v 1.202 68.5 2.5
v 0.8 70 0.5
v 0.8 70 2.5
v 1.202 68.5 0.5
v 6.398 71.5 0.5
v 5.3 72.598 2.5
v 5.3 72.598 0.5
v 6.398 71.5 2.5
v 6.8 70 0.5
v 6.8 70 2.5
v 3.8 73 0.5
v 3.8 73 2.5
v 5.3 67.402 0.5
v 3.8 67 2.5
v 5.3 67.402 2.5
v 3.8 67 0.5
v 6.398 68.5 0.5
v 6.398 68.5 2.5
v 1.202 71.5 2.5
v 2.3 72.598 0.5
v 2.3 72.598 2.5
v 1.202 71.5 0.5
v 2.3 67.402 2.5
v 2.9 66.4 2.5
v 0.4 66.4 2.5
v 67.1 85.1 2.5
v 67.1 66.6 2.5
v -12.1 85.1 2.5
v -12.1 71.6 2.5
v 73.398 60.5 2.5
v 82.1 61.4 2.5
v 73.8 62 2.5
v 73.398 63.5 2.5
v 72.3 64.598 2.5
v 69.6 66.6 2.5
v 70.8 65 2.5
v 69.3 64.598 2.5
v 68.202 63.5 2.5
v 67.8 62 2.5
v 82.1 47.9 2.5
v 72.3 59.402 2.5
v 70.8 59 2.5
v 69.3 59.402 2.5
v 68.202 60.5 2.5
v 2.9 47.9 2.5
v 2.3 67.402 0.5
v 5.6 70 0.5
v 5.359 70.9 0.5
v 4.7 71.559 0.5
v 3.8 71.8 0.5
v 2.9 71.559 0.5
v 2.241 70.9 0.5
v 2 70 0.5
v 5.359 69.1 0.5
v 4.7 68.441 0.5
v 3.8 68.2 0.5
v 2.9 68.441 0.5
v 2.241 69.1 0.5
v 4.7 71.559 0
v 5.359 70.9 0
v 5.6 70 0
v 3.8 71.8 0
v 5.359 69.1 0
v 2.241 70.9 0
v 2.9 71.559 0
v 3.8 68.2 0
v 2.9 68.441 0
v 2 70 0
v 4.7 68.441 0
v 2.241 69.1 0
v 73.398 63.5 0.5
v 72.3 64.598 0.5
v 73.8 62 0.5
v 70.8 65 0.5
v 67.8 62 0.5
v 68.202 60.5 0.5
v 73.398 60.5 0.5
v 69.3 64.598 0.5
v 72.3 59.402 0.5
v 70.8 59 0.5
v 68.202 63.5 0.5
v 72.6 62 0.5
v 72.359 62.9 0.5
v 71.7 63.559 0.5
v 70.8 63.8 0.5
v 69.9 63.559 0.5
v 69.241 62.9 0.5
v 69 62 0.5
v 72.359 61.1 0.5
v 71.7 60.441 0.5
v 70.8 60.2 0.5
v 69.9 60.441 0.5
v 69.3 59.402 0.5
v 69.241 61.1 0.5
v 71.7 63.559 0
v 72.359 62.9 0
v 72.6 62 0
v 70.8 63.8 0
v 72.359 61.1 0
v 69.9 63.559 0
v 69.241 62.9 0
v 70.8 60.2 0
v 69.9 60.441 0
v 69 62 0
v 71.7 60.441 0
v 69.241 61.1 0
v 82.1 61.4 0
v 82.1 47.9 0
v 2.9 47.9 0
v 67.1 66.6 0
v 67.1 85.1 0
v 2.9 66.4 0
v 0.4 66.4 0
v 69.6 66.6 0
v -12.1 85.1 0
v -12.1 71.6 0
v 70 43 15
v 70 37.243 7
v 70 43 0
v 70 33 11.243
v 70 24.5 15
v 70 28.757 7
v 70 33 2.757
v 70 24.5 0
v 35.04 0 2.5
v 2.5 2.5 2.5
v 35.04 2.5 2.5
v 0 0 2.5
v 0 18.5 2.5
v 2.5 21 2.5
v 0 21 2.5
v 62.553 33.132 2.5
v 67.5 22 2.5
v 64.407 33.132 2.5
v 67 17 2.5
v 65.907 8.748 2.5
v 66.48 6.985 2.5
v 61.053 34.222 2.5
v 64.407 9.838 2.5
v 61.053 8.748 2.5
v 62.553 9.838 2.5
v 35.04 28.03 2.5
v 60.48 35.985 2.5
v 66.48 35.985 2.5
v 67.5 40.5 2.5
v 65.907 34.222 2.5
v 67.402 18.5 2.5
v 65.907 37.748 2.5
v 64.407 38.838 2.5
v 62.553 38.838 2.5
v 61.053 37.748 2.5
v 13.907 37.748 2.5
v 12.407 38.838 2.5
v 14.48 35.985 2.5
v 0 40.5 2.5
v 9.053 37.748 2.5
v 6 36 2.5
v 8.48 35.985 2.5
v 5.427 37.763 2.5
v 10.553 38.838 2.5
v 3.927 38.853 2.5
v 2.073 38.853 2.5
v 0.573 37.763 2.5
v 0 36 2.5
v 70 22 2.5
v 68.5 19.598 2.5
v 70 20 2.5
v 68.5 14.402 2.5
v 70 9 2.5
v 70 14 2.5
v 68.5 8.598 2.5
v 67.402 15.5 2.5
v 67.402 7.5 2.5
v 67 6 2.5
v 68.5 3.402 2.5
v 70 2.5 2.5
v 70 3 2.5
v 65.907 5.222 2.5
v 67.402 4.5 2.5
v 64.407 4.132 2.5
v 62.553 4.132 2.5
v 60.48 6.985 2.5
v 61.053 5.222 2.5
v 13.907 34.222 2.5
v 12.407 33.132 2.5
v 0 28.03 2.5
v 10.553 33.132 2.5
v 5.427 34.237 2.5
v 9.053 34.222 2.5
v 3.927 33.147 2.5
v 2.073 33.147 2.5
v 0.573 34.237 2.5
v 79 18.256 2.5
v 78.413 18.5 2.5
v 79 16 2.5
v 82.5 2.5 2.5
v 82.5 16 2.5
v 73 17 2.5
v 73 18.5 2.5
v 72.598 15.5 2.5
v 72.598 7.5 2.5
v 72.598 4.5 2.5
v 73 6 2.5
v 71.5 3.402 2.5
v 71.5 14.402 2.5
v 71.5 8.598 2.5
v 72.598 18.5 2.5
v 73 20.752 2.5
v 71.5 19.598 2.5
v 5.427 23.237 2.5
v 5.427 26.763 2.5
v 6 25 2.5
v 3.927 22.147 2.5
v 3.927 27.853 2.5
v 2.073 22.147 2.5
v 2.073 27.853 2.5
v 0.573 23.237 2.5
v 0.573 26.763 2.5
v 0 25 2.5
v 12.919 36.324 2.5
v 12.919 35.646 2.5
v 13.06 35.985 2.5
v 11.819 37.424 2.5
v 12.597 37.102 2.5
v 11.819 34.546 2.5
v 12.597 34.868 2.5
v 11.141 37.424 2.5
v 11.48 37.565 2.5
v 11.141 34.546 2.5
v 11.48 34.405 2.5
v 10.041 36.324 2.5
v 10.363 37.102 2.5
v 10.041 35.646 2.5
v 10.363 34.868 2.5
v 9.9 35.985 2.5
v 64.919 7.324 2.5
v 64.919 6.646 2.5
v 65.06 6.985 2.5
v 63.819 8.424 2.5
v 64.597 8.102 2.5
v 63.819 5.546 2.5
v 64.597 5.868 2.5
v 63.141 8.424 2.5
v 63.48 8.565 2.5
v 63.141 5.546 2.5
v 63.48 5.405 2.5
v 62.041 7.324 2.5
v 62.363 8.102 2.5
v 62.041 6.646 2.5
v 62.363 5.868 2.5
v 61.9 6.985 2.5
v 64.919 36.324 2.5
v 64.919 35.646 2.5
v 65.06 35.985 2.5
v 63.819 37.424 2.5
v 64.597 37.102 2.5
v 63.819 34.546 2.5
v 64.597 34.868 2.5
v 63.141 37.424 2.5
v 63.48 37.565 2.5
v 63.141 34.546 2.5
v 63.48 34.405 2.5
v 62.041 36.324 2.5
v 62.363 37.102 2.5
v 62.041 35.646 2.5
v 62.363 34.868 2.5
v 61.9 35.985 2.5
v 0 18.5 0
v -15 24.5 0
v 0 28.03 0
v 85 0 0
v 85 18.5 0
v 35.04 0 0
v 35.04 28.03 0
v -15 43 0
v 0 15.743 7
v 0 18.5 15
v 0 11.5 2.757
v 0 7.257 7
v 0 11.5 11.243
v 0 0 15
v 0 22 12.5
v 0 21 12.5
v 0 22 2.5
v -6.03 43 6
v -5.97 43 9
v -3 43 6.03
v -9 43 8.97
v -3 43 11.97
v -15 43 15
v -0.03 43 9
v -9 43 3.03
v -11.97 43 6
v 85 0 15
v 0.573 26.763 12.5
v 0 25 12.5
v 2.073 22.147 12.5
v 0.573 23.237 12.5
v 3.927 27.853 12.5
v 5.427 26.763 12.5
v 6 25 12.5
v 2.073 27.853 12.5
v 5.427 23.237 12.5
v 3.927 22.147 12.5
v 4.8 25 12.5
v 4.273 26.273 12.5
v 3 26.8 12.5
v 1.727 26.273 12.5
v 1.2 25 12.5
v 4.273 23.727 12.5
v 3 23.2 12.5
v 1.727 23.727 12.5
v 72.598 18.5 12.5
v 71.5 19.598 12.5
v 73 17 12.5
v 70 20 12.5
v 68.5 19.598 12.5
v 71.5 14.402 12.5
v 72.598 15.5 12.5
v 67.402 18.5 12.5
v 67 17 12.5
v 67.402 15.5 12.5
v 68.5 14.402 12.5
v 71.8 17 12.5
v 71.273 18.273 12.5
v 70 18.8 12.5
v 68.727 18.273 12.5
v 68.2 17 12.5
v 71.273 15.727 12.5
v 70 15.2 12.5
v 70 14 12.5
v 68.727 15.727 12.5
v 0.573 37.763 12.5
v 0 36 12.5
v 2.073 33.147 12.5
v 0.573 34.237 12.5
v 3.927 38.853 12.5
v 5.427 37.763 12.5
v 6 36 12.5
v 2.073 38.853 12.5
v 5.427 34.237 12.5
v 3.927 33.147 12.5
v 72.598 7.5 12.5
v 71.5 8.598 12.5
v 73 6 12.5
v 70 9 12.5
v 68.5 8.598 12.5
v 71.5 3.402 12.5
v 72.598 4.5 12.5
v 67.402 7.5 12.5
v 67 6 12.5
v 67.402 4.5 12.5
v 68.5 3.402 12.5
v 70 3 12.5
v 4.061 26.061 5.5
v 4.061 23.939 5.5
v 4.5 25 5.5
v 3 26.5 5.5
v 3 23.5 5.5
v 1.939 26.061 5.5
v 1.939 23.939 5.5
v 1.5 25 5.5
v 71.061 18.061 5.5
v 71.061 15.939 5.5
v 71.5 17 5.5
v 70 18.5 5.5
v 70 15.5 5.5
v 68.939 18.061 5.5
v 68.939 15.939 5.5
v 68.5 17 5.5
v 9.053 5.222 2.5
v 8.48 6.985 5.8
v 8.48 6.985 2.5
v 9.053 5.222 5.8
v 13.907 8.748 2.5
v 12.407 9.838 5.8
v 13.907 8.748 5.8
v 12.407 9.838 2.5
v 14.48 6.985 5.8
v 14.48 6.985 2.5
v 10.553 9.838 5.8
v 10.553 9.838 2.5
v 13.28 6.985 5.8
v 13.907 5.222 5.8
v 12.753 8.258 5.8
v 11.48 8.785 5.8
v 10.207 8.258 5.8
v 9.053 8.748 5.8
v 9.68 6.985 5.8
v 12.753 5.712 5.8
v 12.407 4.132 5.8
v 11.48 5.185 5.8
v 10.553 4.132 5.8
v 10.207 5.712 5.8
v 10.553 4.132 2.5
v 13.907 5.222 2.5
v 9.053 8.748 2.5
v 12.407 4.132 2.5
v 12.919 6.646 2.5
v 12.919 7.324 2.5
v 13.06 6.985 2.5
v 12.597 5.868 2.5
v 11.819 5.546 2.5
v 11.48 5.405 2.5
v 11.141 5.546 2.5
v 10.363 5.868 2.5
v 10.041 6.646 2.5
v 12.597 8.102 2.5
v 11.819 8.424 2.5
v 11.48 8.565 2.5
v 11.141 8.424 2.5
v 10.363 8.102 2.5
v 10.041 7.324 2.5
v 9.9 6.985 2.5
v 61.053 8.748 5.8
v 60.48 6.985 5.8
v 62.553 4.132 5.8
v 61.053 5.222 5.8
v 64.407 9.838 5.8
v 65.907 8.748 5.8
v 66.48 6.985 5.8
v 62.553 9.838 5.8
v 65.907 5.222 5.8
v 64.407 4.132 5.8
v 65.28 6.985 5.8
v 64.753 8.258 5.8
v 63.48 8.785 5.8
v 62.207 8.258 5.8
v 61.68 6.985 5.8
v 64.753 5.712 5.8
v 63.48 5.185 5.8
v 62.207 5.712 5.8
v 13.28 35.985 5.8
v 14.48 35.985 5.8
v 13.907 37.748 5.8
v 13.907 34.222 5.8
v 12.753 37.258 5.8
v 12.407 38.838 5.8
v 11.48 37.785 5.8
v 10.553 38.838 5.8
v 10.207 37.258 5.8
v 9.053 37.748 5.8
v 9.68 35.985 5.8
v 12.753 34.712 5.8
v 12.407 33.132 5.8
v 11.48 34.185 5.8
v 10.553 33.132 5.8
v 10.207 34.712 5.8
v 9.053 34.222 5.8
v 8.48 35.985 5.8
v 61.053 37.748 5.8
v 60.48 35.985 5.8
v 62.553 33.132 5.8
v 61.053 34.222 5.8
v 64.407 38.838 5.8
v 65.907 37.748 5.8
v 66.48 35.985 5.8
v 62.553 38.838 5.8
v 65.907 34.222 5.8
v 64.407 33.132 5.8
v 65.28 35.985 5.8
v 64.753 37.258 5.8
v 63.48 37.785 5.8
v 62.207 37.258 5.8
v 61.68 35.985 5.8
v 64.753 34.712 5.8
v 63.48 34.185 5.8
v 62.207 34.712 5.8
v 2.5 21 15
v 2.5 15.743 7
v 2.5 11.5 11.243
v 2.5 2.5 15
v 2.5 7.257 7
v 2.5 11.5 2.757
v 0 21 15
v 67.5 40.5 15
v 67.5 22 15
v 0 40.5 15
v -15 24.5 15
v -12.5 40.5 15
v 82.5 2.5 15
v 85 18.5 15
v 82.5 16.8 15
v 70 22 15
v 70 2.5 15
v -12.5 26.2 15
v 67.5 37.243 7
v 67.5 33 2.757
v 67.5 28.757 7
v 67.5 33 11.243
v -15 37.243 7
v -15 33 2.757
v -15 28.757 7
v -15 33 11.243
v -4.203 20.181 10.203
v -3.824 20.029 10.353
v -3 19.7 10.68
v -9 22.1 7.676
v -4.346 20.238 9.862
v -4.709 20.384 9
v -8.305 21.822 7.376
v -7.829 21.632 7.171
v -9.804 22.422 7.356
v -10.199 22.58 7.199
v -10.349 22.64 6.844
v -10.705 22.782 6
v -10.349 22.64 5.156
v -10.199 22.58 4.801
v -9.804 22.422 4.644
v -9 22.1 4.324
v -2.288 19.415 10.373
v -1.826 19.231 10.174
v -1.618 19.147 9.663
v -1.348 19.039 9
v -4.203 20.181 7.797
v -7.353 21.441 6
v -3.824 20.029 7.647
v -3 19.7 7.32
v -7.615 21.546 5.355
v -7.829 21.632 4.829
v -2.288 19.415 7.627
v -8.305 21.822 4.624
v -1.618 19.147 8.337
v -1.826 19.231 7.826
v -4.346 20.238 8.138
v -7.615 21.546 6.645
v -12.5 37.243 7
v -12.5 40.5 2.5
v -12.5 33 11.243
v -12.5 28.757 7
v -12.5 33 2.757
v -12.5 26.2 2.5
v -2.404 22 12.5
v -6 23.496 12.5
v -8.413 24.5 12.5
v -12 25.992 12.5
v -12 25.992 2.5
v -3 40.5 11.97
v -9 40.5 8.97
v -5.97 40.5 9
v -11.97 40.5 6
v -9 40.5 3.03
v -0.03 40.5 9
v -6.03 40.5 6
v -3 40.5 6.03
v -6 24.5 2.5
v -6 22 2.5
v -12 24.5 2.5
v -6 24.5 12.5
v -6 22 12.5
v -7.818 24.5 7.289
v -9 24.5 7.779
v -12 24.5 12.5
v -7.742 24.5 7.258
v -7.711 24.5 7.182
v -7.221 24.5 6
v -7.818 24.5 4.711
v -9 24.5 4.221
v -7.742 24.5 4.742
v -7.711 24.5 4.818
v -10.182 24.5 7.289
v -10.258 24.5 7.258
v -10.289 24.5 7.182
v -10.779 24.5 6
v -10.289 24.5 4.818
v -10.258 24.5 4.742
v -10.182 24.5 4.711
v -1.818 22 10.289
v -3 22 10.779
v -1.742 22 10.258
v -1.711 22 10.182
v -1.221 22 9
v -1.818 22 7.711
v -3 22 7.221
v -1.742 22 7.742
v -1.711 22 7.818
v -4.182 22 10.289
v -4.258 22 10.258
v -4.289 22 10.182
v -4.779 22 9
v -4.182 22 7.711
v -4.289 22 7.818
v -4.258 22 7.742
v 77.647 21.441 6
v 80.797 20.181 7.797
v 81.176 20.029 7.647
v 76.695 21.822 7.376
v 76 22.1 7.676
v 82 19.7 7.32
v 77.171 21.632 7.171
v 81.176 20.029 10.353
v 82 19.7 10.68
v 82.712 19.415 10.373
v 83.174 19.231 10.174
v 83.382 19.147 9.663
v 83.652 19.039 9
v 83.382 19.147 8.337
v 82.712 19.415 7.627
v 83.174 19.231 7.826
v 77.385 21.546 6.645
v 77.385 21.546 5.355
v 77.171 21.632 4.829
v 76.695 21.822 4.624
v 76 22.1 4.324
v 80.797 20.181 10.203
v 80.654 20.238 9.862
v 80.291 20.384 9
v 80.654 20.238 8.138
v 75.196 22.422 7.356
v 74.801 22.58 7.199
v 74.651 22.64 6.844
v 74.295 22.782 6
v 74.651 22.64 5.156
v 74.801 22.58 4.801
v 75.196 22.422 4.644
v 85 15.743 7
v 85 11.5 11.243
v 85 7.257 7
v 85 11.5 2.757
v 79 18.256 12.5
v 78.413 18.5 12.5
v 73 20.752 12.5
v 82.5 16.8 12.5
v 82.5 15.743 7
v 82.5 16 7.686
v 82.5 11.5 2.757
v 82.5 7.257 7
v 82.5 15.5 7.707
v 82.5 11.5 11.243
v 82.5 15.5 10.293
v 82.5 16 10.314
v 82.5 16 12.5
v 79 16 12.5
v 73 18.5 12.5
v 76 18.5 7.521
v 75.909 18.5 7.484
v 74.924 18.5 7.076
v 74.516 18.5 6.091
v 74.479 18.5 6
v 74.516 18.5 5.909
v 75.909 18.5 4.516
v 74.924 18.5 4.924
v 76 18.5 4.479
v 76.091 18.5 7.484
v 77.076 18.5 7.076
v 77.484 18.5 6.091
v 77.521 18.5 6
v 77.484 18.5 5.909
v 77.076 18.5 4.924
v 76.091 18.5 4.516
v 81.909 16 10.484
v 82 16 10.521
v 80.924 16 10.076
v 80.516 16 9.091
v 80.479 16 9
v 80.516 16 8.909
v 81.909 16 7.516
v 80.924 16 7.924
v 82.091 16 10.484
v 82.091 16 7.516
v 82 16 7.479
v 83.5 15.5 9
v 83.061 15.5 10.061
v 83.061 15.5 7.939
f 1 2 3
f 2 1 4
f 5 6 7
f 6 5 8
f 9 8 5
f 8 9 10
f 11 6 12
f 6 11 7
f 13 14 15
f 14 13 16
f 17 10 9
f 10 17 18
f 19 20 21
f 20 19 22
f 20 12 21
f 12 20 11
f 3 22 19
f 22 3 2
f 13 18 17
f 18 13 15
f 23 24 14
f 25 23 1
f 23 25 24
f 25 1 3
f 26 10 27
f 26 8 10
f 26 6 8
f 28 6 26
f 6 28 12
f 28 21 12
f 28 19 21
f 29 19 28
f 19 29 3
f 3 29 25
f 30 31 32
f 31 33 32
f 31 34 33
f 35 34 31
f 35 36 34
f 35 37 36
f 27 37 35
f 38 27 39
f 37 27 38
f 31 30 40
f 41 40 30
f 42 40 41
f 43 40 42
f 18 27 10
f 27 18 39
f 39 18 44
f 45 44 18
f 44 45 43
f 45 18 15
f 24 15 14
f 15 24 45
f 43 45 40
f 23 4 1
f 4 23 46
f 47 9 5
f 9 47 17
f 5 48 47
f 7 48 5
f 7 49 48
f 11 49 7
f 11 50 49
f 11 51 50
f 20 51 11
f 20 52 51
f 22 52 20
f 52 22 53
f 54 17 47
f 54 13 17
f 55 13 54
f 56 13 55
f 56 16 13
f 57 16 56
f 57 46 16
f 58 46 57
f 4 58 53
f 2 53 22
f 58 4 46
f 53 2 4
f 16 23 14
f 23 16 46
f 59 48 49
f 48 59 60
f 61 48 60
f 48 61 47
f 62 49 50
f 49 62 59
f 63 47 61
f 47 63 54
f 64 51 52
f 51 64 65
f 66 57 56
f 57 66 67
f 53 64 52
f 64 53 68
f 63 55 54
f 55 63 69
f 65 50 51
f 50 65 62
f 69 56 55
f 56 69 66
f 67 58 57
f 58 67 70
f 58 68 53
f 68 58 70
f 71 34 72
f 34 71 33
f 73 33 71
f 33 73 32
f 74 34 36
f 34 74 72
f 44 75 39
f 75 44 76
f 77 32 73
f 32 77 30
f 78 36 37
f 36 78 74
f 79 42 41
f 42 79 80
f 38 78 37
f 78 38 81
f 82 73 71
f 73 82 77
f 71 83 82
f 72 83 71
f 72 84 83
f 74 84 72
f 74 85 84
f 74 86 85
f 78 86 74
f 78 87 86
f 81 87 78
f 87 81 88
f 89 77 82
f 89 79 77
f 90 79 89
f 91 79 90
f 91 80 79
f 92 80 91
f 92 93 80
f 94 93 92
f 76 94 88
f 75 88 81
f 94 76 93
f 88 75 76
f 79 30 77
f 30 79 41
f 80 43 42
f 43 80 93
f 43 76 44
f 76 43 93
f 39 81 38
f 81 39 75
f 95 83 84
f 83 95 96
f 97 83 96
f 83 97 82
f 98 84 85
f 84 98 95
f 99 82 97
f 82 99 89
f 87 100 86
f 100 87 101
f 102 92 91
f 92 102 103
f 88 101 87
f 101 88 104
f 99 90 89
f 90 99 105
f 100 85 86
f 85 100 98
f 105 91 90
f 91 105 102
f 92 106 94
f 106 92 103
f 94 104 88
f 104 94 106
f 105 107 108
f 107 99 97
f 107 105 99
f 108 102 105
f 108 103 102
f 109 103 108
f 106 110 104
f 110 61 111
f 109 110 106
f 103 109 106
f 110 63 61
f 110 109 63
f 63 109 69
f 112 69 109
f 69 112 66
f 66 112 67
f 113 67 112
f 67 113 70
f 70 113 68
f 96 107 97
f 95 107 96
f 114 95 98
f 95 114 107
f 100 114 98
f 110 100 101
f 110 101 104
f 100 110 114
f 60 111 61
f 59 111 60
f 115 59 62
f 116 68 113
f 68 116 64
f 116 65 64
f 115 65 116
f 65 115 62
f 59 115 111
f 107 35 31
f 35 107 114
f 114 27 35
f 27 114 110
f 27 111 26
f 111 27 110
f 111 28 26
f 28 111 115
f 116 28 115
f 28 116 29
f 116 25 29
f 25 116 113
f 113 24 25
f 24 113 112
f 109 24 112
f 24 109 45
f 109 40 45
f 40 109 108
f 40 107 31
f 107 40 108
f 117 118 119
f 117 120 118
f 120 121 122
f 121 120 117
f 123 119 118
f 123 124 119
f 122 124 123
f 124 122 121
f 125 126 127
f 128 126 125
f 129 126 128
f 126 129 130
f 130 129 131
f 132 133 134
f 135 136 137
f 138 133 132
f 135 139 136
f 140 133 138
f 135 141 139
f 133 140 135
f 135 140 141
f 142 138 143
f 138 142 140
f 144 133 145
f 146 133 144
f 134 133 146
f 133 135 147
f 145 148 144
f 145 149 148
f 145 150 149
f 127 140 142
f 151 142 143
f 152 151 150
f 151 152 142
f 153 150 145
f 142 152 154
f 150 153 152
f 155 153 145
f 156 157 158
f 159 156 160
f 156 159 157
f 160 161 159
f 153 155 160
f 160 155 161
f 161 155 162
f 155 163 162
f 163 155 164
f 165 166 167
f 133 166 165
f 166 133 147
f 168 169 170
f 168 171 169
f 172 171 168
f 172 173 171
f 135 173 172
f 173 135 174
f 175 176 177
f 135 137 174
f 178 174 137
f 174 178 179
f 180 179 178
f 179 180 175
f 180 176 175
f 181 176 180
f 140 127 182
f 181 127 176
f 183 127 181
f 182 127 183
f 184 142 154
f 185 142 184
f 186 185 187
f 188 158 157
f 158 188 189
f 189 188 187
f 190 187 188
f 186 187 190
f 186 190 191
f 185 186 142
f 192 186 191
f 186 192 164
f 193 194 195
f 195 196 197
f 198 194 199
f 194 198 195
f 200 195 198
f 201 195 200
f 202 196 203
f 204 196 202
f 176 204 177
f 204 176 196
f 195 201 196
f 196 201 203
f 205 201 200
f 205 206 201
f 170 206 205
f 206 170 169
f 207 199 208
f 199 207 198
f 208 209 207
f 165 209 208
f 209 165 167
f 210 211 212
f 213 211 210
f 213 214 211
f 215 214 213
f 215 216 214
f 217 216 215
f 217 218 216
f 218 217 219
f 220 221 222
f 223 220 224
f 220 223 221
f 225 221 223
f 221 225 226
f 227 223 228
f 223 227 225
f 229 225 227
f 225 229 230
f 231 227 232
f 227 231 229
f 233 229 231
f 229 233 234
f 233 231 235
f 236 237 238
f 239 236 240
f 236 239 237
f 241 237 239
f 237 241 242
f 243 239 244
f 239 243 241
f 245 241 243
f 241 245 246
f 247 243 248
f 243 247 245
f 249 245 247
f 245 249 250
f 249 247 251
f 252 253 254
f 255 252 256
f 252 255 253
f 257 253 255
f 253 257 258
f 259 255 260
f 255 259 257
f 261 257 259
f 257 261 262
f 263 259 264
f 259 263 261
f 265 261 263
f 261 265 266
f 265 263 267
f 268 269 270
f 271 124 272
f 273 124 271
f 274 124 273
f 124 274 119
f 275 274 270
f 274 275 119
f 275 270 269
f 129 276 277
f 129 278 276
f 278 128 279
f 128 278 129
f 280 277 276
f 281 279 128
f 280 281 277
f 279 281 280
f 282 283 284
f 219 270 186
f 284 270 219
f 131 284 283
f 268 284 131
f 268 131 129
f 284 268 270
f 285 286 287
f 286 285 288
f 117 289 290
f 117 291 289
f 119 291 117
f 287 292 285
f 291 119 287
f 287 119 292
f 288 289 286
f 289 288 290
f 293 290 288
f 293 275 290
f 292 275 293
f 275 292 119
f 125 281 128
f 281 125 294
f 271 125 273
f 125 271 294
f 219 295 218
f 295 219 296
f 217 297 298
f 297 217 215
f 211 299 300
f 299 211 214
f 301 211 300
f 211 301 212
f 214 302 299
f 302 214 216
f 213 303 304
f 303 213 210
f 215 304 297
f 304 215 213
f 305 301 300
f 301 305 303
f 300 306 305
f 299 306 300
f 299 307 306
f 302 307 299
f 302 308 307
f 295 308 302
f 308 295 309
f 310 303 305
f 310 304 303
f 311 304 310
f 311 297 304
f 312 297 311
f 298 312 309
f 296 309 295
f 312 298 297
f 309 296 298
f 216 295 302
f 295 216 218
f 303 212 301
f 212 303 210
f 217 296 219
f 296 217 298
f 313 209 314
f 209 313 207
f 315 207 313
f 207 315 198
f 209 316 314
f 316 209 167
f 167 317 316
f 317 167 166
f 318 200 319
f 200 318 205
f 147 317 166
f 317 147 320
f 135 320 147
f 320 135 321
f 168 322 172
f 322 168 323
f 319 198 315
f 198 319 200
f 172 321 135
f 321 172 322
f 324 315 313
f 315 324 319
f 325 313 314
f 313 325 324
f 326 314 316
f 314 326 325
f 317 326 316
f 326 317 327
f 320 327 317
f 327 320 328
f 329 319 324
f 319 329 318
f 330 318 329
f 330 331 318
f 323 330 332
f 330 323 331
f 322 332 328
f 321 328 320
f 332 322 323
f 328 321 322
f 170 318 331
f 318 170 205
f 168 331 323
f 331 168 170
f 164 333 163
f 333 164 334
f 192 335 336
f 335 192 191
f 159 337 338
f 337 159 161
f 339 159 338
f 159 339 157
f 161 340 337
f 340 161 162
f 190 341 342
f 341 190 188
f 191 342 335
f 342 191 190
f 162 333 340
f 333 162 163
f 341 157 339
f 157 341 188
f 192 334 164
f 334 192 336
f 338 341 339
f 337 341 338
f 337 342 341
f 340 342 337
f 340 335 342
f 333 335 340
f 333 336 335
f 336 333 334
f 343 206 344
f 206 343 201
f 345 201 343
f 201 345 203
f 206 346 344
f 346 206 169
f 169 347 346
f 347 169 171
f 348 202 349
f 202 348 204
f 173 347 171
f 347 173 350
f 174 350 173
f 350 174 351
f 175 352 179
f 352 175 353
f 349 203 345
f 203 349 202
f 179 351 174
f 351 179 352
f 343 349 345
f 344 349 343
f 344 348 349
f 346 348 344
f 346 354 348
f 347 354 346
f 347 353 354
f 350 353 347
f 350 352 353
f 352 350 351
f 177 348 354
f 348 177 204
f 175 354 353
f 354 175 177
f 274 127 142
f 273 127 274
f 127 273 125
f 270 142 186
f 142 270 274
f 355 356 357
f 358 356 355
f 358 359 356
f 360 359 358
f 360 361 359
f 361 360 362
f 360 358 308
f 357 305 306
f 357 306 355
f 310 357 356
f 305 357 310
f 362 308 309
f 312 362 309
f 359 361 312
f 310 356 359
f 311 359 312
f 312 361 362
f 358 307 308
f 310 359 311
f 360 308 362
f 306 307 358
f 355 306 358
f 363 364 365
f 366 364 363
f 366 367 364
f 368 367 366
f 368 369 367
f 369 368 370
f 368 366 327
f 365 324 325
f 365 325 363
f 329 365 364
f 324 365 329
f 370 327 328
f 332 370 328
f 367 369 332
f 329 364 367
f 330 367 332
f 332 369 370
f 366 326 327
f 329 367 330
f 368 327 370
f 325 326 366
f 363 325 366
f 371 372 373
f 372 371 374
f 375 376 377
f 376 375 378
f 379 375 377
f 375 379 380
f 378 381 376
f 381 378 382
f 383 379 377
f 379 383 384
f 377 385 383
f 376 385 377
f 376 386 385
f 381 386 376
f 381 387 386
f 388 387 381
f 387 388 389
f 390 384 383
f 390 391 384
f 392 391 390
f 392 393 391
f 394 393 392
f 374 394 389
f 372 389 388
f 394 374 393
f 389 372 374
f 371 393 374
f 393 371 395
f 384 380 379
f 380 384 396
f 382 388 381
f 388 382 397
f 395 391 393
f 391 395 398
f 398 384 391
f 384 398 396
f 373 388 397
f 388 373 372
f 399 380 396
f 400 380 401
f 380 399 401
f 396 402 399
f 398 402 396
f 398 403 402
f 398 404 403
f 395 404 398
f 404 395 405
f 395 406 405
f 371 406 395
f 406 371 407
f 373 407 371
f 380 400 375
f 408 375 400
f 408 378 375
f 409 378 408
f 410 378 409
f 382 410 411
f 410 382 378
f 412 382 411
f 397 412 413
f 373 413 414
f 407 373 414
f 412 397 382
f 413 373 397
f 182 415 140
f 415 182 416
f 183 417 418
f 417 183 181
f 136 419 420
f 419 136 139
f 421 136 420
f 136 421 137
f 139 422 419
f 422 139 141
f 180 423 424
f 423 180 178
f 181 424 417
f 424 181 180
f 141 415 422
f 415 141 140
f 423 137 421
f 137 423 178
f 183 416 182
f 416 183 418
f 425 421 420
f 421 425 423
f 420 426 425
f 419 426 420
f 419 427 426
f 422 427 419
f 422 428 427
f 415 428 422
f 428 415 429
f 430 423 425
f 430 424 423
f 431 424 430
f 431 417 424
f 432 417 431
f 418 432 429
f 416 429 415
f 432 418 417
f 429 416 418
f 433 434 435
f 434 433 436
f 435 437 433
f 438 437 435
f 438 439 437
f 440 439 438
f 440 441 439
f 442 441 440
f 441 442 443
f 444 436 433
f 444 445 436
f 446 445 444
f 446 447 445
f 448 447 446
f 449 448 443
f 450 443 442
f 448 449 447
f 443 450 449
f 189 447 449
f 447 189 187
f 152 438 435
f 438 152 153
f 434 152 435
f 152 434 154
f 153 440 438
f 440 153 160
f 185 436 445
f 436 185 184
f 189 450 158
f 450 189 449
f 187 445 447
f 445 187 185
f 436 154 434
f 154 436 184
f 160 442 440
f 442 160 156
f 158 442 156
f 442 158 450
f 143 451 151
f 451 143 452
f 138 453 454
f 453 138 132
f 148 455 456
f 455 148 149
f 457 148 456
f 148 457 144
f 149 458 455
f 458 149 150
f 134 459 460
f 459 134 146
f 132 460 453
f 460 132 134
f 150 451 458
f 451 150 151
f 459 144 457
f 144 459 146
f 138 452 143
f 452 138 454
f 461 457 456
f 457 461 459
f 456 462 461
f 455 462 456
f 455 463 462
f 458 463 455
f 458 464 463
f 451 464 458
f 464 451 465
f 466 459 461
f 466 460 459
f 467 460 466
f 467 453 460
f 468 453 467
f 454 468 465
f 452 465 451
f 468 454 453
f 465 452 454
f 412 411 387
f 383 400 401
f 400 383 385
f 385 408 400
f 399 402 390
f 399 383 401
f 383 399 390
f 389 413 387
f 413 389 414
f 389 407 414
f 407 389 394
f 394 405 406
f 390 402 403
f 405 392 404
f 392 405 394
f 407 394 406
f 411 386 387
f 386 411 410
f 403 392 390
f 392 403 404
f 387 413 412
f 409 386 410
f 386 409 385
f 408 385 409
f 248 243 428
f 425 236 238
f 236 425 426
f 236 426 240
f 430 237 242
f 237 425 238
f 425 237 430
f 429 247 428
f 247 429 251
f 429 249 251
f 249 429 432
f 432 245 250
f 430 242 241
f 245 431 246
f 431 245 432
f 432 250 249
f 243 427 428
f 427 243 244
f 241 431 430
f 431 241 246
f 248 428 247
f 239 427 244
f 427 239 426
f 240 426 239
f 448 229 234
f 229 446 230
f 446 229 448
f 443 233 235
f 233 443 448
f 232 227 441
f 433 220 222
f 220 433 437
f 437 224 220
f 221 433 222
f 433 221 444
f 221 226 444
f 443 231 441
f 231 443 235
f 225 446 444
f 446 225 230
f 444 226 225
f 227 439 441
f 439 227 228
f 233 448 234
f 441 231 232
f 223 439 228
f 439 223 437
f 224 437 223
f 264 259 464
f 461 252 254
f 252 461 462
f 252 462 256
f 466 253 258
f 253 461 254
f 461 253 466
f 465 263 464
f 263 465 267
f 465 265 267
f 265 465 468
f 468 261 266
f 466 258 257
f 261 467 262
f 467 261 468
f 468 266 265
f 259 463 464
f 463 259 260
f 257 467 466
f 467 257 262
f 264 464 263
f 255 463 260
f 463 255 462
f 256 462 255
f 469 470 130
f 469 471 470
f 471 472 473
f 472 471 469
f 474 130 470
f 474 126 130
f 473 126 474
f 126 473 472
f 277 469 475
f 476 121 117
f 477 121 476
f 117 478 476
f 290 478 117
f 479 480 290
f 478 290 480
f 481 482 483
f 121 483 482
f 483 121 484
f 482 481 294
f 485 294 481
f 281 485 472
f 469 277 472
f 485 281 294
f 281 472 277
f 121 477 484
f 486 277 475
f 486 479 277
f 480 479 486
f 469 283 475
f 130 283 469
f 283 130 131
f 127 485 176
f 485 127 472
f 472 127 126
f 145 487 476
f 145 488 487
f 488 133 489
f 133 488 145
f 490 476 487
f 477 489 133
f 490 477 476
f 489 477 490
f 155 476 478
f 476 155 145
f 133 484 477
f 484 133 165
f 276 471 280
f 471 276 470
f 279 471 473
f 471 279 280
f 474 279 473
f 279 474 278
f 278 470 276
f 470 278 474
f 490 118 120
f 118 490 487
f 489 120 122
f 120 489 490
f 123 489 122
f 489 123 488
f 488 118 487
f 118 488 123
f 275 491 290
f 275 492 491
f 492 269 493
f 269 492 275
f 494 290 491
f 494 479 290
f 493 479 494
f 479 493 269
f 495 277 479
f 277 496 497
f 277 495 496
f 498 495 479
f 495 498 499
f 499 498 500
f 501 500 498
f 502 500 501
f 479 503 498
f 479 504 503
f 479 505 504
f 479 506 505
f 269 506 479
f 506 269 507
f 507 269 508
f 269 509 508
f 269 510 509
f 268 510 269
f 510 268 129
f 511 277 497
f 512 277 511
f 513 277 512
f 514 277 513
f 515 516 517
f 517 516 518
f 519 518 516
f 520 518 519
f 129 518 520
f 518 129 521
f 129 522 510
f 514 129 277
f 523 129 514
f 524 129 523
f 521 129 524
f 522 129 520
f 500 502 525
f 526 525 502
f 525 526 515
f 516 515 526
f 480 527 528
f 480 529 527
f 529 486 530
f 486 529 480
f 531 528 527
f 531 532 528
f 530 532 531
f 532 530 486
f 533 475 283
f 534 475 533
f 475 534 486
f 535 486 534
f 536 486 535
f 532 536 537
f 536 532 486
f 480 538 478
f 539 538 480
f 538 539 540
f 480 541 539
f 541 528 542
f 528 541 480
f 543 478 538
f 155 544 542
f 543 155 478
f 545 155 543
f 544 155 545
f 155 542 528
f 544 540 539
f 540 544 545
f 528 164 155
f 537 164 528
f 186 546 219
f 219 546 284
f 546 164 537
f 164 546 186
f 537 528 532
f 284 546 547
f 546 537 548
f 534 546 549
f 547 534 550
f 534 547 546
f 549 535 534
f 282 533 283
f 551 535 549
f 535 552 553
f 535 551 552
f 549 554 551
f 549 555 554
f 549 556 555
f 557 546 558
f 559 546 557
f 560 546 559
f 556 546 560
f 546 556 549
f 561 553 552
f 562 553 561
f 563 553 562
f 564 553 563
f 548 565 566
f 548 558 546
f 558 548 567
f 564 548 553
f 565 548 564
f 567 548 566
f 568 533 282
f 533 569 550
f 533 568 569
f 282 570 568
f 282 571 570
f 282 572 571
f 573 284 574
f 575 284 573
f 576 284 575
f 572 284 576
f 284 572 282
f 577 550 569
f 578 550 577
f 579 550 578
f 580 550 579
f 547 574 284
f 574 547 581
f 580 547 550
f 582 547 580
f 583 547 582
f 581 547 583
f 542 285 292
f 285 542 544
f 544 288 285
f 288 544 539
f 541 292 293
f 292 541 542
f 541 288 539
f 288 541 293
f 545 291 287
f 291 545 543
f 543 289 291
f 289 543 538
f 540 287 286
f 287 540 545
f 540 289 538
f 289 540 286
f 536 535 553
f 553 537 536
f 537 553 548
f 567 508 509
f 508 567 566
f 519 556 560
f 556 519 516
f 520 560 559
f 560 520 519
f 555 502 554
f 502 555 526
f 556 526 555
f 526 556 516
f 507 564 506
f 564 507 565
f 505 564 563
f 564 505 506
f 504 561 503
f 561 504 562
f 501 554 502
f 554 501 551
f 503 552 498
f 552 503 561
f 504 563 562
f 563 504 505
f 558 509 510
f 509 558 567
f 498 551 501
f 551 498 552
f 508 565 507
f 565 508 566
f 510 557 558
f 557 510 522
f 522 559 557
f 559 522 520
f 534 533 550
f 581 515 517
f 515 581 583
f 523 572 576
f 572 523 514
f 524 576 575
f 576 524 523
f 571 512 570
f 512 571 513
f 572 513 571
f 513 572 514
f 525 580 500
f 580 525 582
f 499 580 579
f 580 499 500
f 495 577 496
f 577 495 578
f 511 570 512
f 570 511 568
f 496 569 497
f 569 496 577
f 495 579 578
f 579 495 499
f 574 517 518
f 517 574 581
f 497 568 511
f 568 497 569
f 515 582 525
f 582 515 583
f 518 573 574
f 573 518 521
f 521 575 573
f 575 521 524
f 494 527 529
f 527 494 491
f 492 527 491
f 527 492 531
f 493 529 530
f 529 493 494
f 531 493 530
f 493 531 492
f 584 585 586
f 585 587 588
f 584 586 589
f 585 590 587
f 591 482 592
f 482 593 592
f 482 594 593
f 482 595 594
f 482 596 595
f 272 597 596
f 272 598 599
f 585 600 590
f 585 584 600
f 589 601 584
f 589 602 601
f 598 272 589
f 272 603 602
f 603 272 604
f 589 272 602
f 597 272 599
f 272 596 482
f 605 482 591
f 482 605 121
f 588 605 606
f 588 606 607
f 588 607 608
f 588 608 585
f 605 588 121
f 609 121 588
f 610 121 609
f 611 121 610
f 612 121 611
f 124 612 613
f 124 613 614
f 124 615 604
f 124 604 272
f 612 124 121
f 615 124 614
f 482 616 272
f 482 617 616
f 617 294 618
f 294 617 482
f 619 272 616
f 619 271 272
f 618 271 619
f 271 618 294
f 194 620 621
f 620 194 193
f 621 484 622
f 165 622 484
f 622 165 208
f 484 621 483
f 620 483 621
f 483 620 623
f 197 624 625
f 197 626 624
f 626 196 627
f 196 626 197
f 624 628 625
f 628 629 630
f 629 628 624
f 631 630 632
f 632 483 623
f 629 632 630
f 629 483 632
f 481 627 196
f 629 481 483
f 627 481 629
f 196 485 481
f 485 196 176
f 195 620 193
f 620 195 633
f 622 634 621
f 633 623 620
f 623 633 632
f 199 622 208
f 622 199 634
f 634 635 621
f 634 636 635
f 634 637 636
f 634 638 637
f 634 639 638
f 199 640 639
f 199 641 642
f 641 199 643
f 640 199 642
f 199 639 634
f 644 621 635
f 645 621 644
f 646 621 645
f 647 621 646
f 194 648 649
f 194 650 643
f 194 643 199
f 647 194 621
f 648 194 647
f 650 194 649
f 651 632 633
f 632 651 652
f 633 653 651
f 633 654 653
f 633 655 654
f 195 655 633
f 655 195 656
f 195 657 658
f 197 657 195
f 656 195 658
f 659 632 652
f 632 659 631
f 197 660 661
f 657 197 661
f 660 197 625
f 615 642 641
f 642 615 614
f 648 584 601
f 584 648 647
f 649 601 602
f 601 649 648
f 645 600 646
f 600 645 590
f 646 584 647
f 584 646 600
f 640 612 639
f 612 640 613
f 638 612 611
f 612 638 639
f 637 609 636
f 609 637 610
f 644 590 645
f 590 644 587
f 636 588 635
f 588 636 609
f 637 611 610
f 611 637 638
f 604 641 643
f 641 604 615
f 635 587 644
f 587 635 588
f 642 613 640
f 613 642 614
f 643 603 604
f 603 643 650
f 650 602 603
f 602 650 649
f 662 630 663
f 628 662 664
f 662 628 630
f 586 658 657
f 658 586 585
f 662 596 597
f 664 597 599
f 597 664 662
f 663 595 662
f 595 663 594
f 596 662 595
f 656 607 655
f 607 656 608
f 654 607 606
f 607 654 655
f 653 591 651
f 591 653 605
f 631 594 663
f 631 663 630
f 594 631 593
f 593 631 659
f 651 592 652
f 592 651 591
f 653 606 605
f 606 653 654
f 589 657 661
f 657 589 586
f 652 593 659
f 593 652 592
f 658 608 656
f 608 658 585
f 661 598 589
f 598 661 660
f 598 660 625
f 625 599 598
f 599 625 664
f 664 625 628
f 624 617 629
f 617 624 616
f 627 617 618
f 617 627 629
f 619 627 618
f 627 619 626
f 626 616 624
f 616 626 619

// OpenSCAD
//
//    ktNOTIFY
//
//

gap = 0.4;
panel_thick = 2.5;
cpu_g = 3.5;

lcd_w = 35.04;
lcd_h = 28.03;
lcd_slope = 0.79;
lcd_gap = 3.3;



rotate( [ 0, 0, 0] )
cover( -15, 45, 0 );

difference(){
    union(){
        cube( [70, 43, panel_thick] );
        
        translate( [3, 25, panel_thick+10/2] )
        cylinder( 10, 3, 3, $fn=10, center=true );
        translate( [70, 17, panel_thick+10/2] )
        cylinder( 10, 3, 3, $fn=12, center=true );
        translate( [3, 36, panel_thick+10/2] )
        cylinder( 10, 3, 3, $fn=10, center=true );
        translate( [70, 6, panel_thick+10/2] )
        cylinder( 10, 3, 3, $fn=12, center=true );
    }
    lcd_window( 70/2 - lcd_w/2, 43/2 - lcd_h/2 );
    lcd_slope( 70/2 - lcd_w/2, 43/2 - lcd_h/2 );
    
    translate( [3, 25, 5.5] )
    cylinder( 7, 1.5, 1.8, $fn=8 );
    translate( [70, 17, 5.5] )
    cylinder( 7, 1.5, 1.8, $fn=8 );
}

difference(){
    lcd_base( 70/2 - lcd_w/2, 43/2 - lcd_h/2, panel_thick );
    lcd_hole( 70/2 - lcd_w/2, 43/2 - lcd_h/2, panel_thick );
}

difference(){
    translate( [0, 0, panel_thick] ){
        union(){
            cube( [2.5, 21, 12.5] );
            cube( [70, 2.5, 12.5] );
            translate( [70-2.5, 24.5-2.5, 0] )
            cube( [2.5, 18.5, 12.5] );
            translate( [0, 43-2.5, 0] )
            cube( [70, 2.5, 12.5] );
        }
    }
    translate( [0, 11.5, 7] )
    rotate( [0, 45, 90] )
    cube( [6, 10, 6], center=true ); 
    translate( [70, 33, 7] )
    rotate( [0, 45, 90] )
    cube( [6, 10, 6], center=true ); 
}

translate( [-15, 0, 0] ){
    difference(){
        union(){
            difference(){
                union(){
                    difference(){
                        linear_extrude( height=panel_thick+12.5 )
                        polygon( points=[ [0,43],[15,43],[15,18.5],[0,24.5] ]);
                        translate( [0, 0, panel_thick] )
                        linear_extrude( height=panel_thick+12.5 )
                        polygon( points=[ [0+2.5,43-2.5],[15,43-2.5],
                            [15,18.5+2.5],[0+2.5,24.5+1.7] ]);
                    }
                    translate( [6, 21.5, 7.5] )
                    cube( [6, 6, 10], center=true );
                    translate( [12, 19, 7.5] )
                    cube( [6, 6, 10], center=true );
                }
                
                translate( [6, 43, 6] )
                rotate( [0, 45, 0] )
                cube( [4.2, 10, 4.2], center=true );
                translate( [12, 43, 9] )
                rotate( [0, 45, 0] )
                cube( [4.2, 10, 4.2], center=true );                
                
                translate( [6, 21.5+6, 7.5] )
                cube( [6, 6, 10], center=true );
                translate( [6, 21.5, 6] )
                rotate( [-90, 0, 0] )
                cylinder( 7, 1.5, 1.8, $fn=8, center=true );

                translate( [12, 19+6, 7.5] )
                cube( [6, 6, 10], center=true );
                translate( [12, 19, 9] )
                rotate( [-90, 0, 0] )
                cylinder( 7, 1.5, 1.8, $fn=8, center=true );
            }
        }
        linear_extrude( height=panel_thick+12.5 )
        polygon( points=[ [0,0],[15,0],[15,18.5],[0,24.5] ]);

        translate( [0, 33, 7] )
        rotate( [0, 45, 90] )
        cube( [6, 10, 6], center=true );
    }
}
translate( [70, 0, 0] ){
    difference(){
        union(){
            difference(){
                union(){
                    difference(){
                        linear_extrude( height=panel_thick+12.5 )
                        polygon( points=[ [0,0],[15,0],[15,18.5],[0,24.5] ]);
                        translate( [0, 0, panel_thick] )
                        linear_extrude( height=panel_thick+12.5 )
                        polygon( points=[ [0,0+2.5],[15-2.5,0+2.5],
                            [15-2.5,18.5-1.7],[0,24.5-2.5] ]);
                    }
                    translate( [6, 21.5, 7.5] )
                    cube( [6, 6, 10], center=true );
                    translate( [12, 19, 7.5] )
                    cube( [6, 6, 10], center=true );
                }
                translate( [6, 21.5, 6] )
                rotate( [-90, 0, 0] )
                cylinder( 7, 1.5, 1.8, $fn=8, center=true );
                translate( [12, 19, 9] )
                rotate( [-90, 0, 0] )
                cylinder( 7, 1.5, 1.8, $fn=8, center=true );
            }
        }
        linear_extrude( height=panel_thick+12.5 )
        polygon( points=[ [0,43],[15,43],[15,18.5],[0,24.5] ]);

        translate( [15, 11.5, 7] )
        rotate( [0, 45, 90] )
        cube( [6, 10, 6], center=true );
    }       
}





module cover( x, y, z, a ){
    translate( [x, y, z] ){
        difference(){
            linear_extrude( height=panel_thick )
            polygon( points=[ [0+2.5+gap,43-2.5-gap],[0+2.5+gap,24.5+1.7+gap],[15+gap,18.5+2.5+gap],
                [15+2.5+gap,18.5+2.5+gap],[15+2.5+gap,0+2.5+gap],[15+70+15-2.5-gap,0+2.5+gap],
                [15+70+15-2.5-gap,18.5-1.7-gap],[15+70+0-gap,24.5-2.5-gap],
                [15+70+0-2.5-gap,24.5-2.5-gap],[15+70+0-2.5-gap,43-2.5-gap]]);
            
            screw_hole( 18, 25, -1.5 );
            screw_hole( 85, 17, -1.5 );
        }
    }
}



module screw_hole( x, y, z ){
    translate( [x+1.6/2, y, panel_thick-2/2] ){
        cylinder( 2, 3, 3, $fn=12, center=true );
        translate( [0, 0, 1.6/2-6/2] )
        cylinder( 6, 1.8, 1.8, $fn=12, center=true );
    }
}


module lcd_window( x, y, z ){
    translate( [x, y, z] )
    cube( [lcd_w, lcd_h, panel_thick] );
}
module lcd_slope( x, y, z ){
    translate( [x + lcd_w/2, y + lcd_h/2, z] ){
        scale( [lcd_w*lcd_slope, lcd_h*lcd_slope, lcd_h*lcd_slope] )
        rotate( [0, 0, 45] )
        cylinder( 1, 1, 0, $fn=4 );
    }
}


module lcd_base( x, y, z ){
    translate( [x-6, y-0.5, z] ){
        translate( [0, 0, lcd_gap/2] )
        cylinder( lcd_gap, 3, 3, center=true, $fn=10 );
        translate( [52, 0, lcd_gap/2] )
        cylinder( lcd_gap, 3, 3, center=true, $fn=10 );
        translate( [0, 29, lcd_gap/2] )
        cylinder( lcd_gap, 3, 3, center=true, $fn=10 );
        translate( [52, 29, lcd_gap/2] )
        cylinder( lcd_gap, 3, 3, center=true, $fn=10 );
    }
}
module lcd_hole( x, y, z ){
    translate( [x-6, y-0.5, z-1.2] ){
        cylinder( 6-1.5, 1.5, 1.8, $fn=8 );
        translate( [52, 0, 0] )
        cylinder( 6-1.5, 1.5, 1.8, $fn=8 );
        translate( [0, 29, 0] )
        cylinder( 6-1.5, 1.5, 1.8, $fn=8 );
        translate( [52, 29, 0] )
        cylinder( 6-1.5, 1.5, 1.8, $fn=8 );
    }
}
